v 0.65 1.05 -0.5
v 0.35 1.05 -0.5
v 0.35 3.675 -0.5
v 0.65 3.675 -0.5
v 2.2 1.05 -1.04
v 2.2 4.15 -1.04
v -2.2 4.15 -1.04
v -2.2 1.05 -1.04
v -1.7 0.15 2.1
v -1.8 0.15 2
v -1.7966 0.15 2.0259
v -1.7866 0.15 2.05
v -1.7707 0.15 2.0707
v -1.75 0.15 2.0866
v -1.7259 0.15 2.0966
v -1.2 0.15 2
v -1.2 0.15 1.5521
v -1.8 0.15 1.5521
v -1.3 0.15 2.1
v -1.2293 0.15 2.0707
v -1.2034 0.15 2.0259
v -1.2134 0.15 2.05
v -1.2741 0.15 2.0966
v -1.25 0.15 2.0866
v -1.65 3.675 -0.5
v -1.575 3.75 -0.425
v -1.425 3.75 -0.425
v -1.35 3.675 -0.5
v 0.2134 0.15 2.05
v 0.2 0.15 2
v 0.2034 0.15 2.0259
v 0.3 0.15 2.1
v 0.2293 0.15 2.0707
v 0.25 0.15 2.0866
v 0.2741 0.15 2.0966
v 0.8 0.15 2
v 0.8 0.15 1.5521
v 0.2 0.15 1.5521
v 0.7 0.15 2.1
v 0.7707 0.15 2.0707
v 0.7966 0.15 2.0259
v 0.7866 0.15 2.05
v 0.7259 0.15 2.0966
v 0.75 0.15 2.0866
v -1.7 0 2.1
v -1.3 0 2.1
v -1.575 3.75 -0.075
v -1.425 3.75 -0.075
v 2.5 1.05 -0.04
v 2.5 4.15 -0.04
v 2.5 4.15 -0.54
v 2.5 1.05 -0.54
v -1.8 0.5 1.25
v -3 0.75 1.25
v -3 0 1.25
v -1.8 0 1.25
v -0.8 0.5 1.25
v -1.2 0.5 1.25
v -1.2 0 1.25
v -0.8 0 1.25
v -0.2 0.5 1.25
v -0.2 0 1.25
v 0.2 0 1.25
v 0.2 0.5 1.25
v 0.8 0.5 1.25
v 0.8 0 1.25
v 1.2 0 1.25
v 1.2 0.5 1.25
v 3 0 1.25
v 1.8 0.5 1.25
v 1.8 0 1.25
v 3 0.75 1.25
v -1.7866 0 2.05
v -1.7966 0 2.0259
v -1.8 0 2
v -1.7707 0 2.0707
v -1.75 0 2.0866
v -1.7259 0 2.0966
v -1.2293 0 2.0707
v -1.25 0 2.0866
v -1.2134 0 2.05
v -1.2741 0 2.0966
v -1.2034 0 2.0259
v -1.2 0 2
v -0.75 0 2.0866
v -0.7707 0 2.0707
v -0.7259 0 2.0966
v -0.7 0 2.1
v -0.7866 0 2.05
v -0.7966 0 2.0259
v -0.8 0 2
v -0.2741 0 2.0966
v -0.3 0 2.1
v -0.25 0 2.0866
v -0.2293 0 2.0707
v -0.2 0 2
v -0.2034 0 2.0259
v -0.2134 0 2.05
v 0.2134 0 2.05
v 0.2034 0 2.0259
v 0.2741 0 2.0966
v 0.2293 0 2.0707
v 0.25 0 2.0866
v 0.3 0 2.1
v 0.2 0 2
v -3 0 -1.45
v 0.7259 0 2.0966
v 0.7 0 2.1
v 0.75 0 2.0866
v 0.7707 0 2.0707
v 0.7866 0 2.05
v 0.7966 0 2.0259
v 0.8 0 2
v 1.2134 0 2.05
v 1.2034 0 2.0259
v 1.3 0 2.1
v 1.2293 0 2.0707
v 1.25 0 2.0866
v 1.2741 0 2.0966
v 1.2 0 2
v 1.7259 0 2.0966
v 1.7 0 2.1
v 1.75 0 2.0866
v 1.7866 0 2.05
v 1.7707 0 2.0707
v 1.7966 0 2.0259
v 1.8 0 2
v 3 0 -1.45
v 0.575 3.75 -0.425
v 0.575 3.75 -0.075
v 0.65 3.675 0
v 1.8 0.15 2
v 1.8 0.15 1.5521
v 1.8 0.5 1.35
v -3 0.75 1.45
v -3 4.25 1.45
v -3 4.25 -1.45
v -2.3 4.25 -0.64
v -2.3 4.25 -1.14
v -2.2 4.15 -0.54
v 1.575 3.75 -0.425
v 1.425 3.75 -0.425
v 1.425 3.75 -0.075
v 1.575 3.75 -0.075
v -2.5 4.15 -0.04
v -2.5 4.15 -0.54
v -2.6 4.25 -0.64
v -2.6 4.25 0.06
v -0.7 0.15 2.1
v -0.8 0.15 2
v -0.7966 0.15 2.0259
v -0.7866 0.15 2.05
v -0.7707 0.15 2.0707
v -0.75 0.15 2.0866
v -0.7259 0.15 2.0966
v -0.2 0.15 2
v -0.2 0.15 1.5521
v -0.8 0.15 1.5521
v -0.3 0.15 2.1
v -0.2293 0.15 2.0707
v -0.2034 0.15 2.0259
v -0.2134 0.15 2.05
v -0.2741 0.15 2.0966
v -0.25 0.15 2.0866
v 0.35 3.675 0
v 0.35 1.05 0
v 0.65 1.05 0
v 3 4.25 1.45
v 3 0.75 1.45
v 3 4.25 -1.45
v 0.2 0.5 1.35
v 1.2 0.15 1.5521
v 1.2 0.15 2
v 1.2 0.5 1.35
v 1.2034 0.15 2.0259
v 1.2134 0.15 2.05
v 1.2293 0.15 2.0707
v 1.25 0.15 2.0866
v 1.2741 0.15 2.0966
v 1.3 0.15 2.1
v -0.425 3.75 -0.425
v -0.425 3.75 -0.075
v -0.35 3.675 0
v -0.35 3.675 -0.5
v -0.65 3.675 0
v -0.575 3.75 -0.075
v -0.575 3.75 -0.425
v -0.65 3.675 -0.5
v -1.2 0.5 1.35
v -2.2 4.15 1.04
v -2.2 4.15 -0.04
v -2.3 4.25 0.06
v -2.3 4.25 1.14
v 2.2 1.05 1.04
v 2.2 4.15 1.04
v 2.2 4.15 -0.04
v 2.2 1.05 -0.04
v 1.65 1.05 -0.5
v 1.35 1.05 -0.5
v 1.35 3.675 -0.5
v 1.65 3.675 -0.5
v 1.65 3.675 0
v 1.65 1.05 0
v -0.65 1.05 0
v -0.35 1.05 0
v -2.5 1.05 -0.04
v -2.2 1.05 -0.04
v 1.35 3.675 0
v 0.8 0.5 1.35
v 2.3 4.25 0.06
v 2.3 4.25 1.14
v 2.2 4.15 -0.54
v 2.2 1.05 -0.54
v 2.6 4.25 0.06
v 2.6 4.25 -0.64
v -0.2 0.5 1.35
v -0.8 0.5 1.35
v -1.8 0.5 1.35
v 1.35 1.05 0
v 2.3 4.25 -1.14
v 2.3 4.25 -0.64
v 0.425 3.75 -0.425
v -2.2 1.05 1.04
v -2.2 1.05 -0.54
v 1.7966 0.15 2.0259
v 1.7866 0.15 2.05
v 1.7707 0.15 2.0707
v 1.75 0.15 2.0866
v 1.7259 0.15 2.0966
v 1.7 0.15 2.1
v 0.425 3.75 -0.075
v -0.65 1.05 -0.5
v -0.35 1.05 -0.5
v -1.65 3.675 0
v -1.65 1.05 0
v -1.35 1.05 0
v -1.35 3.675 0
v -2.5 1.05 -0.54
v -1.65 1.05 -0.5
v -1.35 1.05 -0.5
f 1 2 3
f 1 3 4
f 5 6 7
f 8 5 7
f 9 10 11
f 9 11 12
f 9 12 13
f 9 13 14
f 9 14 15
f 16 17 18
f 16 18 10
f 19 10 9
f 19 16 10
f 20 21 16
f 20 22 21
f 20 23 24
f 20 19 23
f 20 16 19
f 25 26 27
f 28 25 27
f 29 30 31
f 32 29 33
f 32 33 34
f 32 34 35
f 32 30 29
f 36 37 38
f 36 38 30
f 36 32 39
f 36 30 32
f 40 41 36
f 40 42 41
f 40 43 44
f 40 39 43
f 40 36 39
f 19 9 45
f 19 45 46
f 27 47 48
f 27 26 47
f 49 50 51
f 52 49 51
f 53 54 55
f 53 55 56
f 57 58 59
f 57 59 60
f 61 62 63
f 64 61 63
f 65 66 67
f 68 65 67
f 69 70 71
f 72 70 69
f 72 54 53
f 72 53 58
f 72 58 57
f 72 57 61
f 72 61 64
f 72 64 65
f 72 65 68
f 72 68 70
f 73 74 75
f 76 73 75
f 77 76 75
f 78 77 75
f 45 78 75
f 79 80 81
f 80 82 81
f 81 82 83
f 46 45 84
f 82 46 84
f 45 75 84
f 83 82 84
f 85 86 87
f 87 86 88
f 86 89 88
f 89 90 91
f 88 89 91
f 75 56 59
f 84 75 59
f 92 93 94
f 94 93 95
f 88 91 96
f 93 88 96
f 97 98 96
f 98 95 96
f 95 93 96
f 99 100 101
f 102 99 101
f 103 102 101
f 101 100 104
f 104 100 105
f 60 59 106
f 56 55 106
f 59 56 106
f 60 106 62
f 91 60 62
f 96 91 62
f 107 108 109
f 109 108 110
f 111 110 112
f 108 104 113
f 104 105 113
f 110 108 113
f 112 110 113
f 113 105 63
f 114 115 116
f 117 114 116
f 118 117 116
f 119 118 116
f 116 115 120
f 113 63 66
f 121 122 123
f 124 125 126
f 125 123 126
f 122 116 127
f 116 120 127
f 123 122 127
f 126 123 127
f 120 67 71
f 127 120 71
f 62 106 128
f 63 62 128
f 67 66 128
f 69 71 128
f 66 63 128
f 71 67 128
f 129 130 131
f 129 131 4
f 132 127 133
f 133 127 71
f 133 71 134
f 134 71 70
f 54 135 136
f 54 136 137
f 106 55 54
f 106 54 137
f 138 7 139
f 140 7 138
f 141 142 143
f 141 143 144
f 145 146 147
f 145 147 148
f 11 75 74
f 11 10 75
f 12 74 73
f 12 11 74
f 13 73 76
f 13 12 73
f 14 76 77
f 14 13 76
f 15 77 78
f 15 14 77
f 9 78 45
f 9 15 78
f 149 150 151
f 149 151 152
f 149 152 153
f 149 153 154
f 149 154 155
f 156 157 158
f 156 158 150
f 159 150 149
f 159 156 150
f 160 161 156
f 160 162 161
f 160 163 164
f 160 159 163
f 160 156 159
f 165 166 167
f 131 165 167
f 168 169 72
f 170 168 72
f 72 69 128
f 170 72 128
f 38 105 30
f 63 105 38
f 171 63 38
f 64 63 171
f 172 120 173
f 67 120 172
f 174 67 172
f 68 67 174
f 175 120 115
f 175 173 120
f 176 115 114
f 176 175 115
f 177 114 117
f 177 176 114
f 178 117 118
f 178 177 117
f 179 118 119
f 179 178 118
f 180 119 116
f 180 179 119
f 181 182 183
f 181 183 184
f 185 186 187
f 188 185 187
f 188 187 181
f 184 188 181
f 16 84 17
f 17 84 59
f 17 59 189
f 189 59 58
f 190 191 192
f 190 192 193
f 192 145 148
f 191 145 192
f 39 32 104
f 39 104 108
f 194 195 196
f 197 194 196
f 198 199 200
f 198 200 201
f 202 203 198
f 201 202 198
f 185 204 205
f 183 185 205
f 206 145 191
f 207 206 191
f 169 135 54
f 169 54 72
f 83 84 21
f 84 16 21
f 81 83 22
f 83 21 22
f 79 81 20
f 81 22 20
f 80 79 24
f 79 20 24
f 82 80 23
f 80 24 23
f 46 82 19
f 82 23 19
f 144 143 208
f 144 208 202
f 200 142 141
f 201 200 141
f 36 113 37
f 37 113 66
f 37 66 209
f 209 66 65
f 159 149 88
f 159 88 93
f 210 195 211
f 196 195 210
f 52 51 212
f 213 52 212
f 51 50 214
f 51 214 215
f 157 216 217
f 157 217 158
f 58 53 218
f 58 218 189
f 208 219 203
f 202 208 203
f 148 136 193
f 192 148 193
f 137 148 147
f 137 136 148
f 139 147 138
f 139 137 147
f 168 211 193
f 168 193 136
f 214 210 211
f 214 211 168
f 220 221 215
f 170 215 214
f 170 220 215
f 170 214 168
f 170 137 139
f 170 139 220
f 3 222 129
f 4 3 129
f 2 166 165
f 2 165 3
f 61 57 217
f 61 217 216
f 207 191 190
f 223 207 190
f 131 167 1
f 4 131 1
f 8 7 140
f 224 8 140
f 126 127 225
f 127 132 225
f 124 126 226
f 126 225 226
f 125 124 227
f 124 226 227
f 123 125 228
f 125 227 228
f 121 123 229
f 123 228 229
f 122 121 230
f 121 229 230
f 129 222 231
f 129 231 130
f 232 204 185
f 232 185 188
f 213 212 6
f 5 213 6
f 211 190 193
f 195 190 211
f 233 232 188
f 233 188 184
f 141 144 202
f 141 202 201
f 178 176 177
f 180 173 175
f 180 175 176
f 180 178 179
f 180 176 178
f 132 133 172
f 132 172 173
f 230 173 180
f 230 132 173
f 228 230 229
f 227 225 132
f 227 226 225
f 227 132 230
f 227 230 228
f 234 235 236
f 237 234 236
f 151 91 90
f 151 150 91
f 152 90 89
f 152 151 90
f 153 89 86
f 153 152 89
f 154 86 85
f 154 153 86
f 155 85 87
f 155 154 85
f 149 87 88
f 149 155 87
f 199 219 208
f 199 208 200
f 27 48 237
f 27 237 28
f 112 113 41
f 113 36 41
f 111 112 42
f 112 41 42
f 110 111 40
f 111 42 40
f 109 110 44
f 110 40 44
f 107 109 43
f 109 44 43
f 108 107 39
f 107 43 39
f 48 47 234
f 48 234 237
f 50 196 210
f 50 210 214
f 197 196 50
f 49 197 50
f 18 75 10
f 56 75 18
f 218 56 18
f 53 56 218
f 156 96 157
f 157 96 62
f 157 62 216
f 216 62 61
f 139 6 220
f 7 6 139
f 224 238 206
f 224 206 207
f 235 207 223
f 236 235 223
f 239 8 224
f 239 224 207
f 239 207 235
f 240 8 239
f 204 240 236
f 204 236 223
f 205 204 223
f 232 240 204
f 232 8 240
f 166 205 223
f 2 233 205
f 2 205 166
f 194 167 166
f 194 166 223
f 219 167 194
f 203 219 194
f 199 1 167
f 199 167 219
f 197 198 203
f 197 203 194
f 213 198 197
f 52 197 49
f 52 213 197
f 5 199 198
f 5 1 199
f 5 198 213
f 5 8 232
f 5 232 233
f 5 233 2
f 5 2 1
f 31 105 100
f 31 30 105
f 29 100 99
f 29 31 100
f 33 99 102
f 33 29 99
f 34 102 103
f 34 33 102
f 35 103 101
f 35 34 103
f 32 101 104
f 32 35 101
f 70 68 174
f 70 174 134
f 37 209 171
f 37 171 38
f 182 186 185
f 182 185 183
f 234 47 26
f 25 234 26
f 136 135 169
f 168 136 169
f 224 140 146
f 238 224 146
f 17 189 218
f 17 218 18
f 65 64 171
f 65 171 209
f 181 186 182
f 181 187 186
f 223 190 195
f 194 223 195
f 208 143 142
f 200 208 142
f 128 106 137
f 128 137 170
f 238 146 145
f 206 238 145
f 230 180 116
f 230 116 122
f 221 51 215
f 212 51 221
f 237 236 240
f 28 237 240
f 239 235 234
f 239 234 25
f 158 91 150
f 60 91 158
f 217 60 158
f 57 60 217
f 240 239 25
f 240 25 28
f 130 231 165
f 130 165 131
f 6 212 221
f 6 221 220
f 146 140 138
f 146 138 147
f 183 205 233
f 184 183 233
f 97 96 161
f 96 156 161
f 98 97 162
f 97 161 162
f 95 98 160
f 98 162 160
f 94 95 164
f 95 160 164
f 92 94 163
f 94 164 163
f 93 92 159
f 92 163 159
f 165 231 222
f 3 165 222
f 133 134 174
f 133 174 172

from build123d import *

# Parameters (mm, degrees)
SKETCH1_W           = 6
SKETCH1_H           = 2.9
BOSS_EXTRUDE1_DEPTH = 4.25
CUT_EXTRUDE1_DEPTH  = 3.2
SKETCH4_W           = 6
SKETCH4_H           = 0.75
CUT_EXTRUDE2_DEPTH  = 0.2
SKETCH5_W           = 0.6
SKETCH5_H           = 0.5
BOSS_EXTRUDE2_DEPTH = 0.85
CUT_EXTRUDE3_DEPTH  = 7.74629528
SKETCH7_W           = 0.3
SKETCH7_H           = 0.5
BOSS_EXTRUDE3_DEPTH = 2.7
CHAMFER1_SIZE       = 0.075
FILLET1_R           = 0.1
CHAMFER2_SIZE       = 0.1


with BuildPart() as part:
    # Sketch1 → Boss-Extrude1 (new body)
    with BuildSketch(Plane(origin=(0, 0, 0), x_dir=(1, 0, 0), z_dir=(0, 1, 0))):
        Rectangle(SKETCH1_W, SKETCH1_H)
    extrude(amount=BOSS_EXTRUDE1_DEPTH)

    # Sketch2 → Cut-Extrude1 (cut)
    with BuildSketch(Plane(origin=(0, 4.25, 0), x_dir=(1, 0, 0), z_dir=(0, 1, 0))):
        Polygon((2.2, 0.04), (2.5, 0.04), (2.5, 0.54), (2.2, 0.54), (2.2, 1.04), (-2.2, 1.04), (-2.2, 0.54), (-2.5, 0.54), (-2.5, 0.04), (-2.2, 0.04), (-2.2, -1.04), (2.2, -1.04), align=None)
    extrude(amount=-CUT_EXTRUDE1_DEPTH, mode=Mode.SUBTRACT)

    # Sketch4 → Cut-Extrude2 (cut)
    with BuildSketch(Plane.XY.offset(1.45)):
        with Locations((0, 0.375)):
            Rectangle(SKETCH4_W, SKETCH4_H)
    extrude(amount=-CUT_EXTRUDE2_DEPTH, mode=Mode.SUBTRACT)

    # Sketch5 → Boss-Extrude2 (add)
    with BuildSketch(Plane.XY.offset(1.25)):
        with Locations((-0.5, 0.25)):
            Rectangle(SKETCH5_W, SKETCH5_H)
        with Locations((-1.5, 0.25)):
            Rectangle(SKETCH5_W, SKETCH5_H)
        with Locations((1.5, 0.25)):
            Rectangle(SKETCH5_W, SKETCH5_H)
        with Locations((0.5, 0.25)):
            Rectangle(SKETCH5_W, SKETCH5_H)
    extrude(amount=BOSS_EXTRUDE2_DEPTH)

    # Sketch6 → Cut-Extrude3 (cut, through all)
    with BuildSketch(Plane(origin=(1.8, 0, 0), x_dir=(0, 0, -1), z_dir=(1, 0, 0))):
        Polygon((-1.35, 0.5), (-1.552072594, 0.15), (-2.1, 0.15), (-2.1, 0.5), align=None)
    extrude(amount=-CUT_EXTRUDE3_DEPTH, mode=Mode.SUBTRACT)

    # Sketch7 → Boss-Extrude3 (add)
    with BuildSketch(Plane(origin=(0, 1.05, 0), x_dir=(1, 0, 0), z_dir=(0, 1, 0))):
        with Locations((-1.5, 0.25)):
            Rectangle(SKETCH7_W, SKETCH7_H)
        with Locations((-0.5, 0.25)):
            Rectangle(SKETCH7_W, SKETCH7_H)
        with Locations((1.5, 0.25)):
            Rectangle(SKETCH7_W, SKETCH7_H)
        with Locations((0.5, 0.25)):
            Rectangle(SKETCH7_W, SKETCH7_H)
    extrude(amount=BOSS_EXTRUDE3_DEPTH)

    # Chamfer1
    chamfer1_edges = [part.edges().sort_by_distance(p)[0] for p in [
        (-0.5, 3.75, 0),
        (-0.65, 3.75, -0.25),
        (-0.5, 3.75, -0.5),
        (-0.35, 3.75, -0.25),
        (-1.5, 3.75, 0),
        (-1.65, 3.75, -0.25),
        (-1.5, 3.75, -0.5),
        (-1.35, 3.75, -0.25),
        (1.5, 3.75, -0.5),
        (1.65, 3.75, -0.25),
        (1.5, 3.75, 0),
        (1.35, 3.75, -0.25),
        (0.35, 3.75, -0.25),
        (0.5, 3.75, -0.5),
        (0.65, 3.75, -0.25),
        (0.5, 3.75, 0),
    ]]
    chamfer(chamfer1_edges, length=CHAMFER1_SIZE)

    # Fillet1
    fillet1_edges = [part.edges().sort_by_distance(p)[0] for p in [
        (0.2, 0.075, 2.1),
        (1.2, 0.075, 2.1),
        (-1.8, 0.075, 2.1),
        (-0.8, 0.075, 2.1),
        (-0.2, 0.075, 2.1),
        (-1.2, 0.075, 2.1),
        (1.8, 0.075, 2.1),
        (0.8, 0.075, 2.1),
    ]]
    fillet(fillet1_edges, radius=FILLET1_R)

    # Chamfer2
    chamfer2_edges = [part.edges().sort_by_distance(p)[0] for p in [
        (2.2, 4.25, -0.79),
        (0, 4.25, -1.04),
        (-2.2, 4.25, -0.79),
        (-2.35, 4.25, -0.54),
        (-2.5, 4.25, -0.29),
        (-2.35, 4.25, -0.04),
        (-2.2, 4.25, 0.5),
        (0, 4.25, 1.04),
        (2.2, 4.25, 0.5),
        (2.35, 4.25, -0.04),
        (2.5, 4.25, -0.29),
        (2.35, 4.25, -0.54),
    ]]
    chamfer(chamfer2_edges, length=CHAMFER2_SIZE)


solid = part.part
